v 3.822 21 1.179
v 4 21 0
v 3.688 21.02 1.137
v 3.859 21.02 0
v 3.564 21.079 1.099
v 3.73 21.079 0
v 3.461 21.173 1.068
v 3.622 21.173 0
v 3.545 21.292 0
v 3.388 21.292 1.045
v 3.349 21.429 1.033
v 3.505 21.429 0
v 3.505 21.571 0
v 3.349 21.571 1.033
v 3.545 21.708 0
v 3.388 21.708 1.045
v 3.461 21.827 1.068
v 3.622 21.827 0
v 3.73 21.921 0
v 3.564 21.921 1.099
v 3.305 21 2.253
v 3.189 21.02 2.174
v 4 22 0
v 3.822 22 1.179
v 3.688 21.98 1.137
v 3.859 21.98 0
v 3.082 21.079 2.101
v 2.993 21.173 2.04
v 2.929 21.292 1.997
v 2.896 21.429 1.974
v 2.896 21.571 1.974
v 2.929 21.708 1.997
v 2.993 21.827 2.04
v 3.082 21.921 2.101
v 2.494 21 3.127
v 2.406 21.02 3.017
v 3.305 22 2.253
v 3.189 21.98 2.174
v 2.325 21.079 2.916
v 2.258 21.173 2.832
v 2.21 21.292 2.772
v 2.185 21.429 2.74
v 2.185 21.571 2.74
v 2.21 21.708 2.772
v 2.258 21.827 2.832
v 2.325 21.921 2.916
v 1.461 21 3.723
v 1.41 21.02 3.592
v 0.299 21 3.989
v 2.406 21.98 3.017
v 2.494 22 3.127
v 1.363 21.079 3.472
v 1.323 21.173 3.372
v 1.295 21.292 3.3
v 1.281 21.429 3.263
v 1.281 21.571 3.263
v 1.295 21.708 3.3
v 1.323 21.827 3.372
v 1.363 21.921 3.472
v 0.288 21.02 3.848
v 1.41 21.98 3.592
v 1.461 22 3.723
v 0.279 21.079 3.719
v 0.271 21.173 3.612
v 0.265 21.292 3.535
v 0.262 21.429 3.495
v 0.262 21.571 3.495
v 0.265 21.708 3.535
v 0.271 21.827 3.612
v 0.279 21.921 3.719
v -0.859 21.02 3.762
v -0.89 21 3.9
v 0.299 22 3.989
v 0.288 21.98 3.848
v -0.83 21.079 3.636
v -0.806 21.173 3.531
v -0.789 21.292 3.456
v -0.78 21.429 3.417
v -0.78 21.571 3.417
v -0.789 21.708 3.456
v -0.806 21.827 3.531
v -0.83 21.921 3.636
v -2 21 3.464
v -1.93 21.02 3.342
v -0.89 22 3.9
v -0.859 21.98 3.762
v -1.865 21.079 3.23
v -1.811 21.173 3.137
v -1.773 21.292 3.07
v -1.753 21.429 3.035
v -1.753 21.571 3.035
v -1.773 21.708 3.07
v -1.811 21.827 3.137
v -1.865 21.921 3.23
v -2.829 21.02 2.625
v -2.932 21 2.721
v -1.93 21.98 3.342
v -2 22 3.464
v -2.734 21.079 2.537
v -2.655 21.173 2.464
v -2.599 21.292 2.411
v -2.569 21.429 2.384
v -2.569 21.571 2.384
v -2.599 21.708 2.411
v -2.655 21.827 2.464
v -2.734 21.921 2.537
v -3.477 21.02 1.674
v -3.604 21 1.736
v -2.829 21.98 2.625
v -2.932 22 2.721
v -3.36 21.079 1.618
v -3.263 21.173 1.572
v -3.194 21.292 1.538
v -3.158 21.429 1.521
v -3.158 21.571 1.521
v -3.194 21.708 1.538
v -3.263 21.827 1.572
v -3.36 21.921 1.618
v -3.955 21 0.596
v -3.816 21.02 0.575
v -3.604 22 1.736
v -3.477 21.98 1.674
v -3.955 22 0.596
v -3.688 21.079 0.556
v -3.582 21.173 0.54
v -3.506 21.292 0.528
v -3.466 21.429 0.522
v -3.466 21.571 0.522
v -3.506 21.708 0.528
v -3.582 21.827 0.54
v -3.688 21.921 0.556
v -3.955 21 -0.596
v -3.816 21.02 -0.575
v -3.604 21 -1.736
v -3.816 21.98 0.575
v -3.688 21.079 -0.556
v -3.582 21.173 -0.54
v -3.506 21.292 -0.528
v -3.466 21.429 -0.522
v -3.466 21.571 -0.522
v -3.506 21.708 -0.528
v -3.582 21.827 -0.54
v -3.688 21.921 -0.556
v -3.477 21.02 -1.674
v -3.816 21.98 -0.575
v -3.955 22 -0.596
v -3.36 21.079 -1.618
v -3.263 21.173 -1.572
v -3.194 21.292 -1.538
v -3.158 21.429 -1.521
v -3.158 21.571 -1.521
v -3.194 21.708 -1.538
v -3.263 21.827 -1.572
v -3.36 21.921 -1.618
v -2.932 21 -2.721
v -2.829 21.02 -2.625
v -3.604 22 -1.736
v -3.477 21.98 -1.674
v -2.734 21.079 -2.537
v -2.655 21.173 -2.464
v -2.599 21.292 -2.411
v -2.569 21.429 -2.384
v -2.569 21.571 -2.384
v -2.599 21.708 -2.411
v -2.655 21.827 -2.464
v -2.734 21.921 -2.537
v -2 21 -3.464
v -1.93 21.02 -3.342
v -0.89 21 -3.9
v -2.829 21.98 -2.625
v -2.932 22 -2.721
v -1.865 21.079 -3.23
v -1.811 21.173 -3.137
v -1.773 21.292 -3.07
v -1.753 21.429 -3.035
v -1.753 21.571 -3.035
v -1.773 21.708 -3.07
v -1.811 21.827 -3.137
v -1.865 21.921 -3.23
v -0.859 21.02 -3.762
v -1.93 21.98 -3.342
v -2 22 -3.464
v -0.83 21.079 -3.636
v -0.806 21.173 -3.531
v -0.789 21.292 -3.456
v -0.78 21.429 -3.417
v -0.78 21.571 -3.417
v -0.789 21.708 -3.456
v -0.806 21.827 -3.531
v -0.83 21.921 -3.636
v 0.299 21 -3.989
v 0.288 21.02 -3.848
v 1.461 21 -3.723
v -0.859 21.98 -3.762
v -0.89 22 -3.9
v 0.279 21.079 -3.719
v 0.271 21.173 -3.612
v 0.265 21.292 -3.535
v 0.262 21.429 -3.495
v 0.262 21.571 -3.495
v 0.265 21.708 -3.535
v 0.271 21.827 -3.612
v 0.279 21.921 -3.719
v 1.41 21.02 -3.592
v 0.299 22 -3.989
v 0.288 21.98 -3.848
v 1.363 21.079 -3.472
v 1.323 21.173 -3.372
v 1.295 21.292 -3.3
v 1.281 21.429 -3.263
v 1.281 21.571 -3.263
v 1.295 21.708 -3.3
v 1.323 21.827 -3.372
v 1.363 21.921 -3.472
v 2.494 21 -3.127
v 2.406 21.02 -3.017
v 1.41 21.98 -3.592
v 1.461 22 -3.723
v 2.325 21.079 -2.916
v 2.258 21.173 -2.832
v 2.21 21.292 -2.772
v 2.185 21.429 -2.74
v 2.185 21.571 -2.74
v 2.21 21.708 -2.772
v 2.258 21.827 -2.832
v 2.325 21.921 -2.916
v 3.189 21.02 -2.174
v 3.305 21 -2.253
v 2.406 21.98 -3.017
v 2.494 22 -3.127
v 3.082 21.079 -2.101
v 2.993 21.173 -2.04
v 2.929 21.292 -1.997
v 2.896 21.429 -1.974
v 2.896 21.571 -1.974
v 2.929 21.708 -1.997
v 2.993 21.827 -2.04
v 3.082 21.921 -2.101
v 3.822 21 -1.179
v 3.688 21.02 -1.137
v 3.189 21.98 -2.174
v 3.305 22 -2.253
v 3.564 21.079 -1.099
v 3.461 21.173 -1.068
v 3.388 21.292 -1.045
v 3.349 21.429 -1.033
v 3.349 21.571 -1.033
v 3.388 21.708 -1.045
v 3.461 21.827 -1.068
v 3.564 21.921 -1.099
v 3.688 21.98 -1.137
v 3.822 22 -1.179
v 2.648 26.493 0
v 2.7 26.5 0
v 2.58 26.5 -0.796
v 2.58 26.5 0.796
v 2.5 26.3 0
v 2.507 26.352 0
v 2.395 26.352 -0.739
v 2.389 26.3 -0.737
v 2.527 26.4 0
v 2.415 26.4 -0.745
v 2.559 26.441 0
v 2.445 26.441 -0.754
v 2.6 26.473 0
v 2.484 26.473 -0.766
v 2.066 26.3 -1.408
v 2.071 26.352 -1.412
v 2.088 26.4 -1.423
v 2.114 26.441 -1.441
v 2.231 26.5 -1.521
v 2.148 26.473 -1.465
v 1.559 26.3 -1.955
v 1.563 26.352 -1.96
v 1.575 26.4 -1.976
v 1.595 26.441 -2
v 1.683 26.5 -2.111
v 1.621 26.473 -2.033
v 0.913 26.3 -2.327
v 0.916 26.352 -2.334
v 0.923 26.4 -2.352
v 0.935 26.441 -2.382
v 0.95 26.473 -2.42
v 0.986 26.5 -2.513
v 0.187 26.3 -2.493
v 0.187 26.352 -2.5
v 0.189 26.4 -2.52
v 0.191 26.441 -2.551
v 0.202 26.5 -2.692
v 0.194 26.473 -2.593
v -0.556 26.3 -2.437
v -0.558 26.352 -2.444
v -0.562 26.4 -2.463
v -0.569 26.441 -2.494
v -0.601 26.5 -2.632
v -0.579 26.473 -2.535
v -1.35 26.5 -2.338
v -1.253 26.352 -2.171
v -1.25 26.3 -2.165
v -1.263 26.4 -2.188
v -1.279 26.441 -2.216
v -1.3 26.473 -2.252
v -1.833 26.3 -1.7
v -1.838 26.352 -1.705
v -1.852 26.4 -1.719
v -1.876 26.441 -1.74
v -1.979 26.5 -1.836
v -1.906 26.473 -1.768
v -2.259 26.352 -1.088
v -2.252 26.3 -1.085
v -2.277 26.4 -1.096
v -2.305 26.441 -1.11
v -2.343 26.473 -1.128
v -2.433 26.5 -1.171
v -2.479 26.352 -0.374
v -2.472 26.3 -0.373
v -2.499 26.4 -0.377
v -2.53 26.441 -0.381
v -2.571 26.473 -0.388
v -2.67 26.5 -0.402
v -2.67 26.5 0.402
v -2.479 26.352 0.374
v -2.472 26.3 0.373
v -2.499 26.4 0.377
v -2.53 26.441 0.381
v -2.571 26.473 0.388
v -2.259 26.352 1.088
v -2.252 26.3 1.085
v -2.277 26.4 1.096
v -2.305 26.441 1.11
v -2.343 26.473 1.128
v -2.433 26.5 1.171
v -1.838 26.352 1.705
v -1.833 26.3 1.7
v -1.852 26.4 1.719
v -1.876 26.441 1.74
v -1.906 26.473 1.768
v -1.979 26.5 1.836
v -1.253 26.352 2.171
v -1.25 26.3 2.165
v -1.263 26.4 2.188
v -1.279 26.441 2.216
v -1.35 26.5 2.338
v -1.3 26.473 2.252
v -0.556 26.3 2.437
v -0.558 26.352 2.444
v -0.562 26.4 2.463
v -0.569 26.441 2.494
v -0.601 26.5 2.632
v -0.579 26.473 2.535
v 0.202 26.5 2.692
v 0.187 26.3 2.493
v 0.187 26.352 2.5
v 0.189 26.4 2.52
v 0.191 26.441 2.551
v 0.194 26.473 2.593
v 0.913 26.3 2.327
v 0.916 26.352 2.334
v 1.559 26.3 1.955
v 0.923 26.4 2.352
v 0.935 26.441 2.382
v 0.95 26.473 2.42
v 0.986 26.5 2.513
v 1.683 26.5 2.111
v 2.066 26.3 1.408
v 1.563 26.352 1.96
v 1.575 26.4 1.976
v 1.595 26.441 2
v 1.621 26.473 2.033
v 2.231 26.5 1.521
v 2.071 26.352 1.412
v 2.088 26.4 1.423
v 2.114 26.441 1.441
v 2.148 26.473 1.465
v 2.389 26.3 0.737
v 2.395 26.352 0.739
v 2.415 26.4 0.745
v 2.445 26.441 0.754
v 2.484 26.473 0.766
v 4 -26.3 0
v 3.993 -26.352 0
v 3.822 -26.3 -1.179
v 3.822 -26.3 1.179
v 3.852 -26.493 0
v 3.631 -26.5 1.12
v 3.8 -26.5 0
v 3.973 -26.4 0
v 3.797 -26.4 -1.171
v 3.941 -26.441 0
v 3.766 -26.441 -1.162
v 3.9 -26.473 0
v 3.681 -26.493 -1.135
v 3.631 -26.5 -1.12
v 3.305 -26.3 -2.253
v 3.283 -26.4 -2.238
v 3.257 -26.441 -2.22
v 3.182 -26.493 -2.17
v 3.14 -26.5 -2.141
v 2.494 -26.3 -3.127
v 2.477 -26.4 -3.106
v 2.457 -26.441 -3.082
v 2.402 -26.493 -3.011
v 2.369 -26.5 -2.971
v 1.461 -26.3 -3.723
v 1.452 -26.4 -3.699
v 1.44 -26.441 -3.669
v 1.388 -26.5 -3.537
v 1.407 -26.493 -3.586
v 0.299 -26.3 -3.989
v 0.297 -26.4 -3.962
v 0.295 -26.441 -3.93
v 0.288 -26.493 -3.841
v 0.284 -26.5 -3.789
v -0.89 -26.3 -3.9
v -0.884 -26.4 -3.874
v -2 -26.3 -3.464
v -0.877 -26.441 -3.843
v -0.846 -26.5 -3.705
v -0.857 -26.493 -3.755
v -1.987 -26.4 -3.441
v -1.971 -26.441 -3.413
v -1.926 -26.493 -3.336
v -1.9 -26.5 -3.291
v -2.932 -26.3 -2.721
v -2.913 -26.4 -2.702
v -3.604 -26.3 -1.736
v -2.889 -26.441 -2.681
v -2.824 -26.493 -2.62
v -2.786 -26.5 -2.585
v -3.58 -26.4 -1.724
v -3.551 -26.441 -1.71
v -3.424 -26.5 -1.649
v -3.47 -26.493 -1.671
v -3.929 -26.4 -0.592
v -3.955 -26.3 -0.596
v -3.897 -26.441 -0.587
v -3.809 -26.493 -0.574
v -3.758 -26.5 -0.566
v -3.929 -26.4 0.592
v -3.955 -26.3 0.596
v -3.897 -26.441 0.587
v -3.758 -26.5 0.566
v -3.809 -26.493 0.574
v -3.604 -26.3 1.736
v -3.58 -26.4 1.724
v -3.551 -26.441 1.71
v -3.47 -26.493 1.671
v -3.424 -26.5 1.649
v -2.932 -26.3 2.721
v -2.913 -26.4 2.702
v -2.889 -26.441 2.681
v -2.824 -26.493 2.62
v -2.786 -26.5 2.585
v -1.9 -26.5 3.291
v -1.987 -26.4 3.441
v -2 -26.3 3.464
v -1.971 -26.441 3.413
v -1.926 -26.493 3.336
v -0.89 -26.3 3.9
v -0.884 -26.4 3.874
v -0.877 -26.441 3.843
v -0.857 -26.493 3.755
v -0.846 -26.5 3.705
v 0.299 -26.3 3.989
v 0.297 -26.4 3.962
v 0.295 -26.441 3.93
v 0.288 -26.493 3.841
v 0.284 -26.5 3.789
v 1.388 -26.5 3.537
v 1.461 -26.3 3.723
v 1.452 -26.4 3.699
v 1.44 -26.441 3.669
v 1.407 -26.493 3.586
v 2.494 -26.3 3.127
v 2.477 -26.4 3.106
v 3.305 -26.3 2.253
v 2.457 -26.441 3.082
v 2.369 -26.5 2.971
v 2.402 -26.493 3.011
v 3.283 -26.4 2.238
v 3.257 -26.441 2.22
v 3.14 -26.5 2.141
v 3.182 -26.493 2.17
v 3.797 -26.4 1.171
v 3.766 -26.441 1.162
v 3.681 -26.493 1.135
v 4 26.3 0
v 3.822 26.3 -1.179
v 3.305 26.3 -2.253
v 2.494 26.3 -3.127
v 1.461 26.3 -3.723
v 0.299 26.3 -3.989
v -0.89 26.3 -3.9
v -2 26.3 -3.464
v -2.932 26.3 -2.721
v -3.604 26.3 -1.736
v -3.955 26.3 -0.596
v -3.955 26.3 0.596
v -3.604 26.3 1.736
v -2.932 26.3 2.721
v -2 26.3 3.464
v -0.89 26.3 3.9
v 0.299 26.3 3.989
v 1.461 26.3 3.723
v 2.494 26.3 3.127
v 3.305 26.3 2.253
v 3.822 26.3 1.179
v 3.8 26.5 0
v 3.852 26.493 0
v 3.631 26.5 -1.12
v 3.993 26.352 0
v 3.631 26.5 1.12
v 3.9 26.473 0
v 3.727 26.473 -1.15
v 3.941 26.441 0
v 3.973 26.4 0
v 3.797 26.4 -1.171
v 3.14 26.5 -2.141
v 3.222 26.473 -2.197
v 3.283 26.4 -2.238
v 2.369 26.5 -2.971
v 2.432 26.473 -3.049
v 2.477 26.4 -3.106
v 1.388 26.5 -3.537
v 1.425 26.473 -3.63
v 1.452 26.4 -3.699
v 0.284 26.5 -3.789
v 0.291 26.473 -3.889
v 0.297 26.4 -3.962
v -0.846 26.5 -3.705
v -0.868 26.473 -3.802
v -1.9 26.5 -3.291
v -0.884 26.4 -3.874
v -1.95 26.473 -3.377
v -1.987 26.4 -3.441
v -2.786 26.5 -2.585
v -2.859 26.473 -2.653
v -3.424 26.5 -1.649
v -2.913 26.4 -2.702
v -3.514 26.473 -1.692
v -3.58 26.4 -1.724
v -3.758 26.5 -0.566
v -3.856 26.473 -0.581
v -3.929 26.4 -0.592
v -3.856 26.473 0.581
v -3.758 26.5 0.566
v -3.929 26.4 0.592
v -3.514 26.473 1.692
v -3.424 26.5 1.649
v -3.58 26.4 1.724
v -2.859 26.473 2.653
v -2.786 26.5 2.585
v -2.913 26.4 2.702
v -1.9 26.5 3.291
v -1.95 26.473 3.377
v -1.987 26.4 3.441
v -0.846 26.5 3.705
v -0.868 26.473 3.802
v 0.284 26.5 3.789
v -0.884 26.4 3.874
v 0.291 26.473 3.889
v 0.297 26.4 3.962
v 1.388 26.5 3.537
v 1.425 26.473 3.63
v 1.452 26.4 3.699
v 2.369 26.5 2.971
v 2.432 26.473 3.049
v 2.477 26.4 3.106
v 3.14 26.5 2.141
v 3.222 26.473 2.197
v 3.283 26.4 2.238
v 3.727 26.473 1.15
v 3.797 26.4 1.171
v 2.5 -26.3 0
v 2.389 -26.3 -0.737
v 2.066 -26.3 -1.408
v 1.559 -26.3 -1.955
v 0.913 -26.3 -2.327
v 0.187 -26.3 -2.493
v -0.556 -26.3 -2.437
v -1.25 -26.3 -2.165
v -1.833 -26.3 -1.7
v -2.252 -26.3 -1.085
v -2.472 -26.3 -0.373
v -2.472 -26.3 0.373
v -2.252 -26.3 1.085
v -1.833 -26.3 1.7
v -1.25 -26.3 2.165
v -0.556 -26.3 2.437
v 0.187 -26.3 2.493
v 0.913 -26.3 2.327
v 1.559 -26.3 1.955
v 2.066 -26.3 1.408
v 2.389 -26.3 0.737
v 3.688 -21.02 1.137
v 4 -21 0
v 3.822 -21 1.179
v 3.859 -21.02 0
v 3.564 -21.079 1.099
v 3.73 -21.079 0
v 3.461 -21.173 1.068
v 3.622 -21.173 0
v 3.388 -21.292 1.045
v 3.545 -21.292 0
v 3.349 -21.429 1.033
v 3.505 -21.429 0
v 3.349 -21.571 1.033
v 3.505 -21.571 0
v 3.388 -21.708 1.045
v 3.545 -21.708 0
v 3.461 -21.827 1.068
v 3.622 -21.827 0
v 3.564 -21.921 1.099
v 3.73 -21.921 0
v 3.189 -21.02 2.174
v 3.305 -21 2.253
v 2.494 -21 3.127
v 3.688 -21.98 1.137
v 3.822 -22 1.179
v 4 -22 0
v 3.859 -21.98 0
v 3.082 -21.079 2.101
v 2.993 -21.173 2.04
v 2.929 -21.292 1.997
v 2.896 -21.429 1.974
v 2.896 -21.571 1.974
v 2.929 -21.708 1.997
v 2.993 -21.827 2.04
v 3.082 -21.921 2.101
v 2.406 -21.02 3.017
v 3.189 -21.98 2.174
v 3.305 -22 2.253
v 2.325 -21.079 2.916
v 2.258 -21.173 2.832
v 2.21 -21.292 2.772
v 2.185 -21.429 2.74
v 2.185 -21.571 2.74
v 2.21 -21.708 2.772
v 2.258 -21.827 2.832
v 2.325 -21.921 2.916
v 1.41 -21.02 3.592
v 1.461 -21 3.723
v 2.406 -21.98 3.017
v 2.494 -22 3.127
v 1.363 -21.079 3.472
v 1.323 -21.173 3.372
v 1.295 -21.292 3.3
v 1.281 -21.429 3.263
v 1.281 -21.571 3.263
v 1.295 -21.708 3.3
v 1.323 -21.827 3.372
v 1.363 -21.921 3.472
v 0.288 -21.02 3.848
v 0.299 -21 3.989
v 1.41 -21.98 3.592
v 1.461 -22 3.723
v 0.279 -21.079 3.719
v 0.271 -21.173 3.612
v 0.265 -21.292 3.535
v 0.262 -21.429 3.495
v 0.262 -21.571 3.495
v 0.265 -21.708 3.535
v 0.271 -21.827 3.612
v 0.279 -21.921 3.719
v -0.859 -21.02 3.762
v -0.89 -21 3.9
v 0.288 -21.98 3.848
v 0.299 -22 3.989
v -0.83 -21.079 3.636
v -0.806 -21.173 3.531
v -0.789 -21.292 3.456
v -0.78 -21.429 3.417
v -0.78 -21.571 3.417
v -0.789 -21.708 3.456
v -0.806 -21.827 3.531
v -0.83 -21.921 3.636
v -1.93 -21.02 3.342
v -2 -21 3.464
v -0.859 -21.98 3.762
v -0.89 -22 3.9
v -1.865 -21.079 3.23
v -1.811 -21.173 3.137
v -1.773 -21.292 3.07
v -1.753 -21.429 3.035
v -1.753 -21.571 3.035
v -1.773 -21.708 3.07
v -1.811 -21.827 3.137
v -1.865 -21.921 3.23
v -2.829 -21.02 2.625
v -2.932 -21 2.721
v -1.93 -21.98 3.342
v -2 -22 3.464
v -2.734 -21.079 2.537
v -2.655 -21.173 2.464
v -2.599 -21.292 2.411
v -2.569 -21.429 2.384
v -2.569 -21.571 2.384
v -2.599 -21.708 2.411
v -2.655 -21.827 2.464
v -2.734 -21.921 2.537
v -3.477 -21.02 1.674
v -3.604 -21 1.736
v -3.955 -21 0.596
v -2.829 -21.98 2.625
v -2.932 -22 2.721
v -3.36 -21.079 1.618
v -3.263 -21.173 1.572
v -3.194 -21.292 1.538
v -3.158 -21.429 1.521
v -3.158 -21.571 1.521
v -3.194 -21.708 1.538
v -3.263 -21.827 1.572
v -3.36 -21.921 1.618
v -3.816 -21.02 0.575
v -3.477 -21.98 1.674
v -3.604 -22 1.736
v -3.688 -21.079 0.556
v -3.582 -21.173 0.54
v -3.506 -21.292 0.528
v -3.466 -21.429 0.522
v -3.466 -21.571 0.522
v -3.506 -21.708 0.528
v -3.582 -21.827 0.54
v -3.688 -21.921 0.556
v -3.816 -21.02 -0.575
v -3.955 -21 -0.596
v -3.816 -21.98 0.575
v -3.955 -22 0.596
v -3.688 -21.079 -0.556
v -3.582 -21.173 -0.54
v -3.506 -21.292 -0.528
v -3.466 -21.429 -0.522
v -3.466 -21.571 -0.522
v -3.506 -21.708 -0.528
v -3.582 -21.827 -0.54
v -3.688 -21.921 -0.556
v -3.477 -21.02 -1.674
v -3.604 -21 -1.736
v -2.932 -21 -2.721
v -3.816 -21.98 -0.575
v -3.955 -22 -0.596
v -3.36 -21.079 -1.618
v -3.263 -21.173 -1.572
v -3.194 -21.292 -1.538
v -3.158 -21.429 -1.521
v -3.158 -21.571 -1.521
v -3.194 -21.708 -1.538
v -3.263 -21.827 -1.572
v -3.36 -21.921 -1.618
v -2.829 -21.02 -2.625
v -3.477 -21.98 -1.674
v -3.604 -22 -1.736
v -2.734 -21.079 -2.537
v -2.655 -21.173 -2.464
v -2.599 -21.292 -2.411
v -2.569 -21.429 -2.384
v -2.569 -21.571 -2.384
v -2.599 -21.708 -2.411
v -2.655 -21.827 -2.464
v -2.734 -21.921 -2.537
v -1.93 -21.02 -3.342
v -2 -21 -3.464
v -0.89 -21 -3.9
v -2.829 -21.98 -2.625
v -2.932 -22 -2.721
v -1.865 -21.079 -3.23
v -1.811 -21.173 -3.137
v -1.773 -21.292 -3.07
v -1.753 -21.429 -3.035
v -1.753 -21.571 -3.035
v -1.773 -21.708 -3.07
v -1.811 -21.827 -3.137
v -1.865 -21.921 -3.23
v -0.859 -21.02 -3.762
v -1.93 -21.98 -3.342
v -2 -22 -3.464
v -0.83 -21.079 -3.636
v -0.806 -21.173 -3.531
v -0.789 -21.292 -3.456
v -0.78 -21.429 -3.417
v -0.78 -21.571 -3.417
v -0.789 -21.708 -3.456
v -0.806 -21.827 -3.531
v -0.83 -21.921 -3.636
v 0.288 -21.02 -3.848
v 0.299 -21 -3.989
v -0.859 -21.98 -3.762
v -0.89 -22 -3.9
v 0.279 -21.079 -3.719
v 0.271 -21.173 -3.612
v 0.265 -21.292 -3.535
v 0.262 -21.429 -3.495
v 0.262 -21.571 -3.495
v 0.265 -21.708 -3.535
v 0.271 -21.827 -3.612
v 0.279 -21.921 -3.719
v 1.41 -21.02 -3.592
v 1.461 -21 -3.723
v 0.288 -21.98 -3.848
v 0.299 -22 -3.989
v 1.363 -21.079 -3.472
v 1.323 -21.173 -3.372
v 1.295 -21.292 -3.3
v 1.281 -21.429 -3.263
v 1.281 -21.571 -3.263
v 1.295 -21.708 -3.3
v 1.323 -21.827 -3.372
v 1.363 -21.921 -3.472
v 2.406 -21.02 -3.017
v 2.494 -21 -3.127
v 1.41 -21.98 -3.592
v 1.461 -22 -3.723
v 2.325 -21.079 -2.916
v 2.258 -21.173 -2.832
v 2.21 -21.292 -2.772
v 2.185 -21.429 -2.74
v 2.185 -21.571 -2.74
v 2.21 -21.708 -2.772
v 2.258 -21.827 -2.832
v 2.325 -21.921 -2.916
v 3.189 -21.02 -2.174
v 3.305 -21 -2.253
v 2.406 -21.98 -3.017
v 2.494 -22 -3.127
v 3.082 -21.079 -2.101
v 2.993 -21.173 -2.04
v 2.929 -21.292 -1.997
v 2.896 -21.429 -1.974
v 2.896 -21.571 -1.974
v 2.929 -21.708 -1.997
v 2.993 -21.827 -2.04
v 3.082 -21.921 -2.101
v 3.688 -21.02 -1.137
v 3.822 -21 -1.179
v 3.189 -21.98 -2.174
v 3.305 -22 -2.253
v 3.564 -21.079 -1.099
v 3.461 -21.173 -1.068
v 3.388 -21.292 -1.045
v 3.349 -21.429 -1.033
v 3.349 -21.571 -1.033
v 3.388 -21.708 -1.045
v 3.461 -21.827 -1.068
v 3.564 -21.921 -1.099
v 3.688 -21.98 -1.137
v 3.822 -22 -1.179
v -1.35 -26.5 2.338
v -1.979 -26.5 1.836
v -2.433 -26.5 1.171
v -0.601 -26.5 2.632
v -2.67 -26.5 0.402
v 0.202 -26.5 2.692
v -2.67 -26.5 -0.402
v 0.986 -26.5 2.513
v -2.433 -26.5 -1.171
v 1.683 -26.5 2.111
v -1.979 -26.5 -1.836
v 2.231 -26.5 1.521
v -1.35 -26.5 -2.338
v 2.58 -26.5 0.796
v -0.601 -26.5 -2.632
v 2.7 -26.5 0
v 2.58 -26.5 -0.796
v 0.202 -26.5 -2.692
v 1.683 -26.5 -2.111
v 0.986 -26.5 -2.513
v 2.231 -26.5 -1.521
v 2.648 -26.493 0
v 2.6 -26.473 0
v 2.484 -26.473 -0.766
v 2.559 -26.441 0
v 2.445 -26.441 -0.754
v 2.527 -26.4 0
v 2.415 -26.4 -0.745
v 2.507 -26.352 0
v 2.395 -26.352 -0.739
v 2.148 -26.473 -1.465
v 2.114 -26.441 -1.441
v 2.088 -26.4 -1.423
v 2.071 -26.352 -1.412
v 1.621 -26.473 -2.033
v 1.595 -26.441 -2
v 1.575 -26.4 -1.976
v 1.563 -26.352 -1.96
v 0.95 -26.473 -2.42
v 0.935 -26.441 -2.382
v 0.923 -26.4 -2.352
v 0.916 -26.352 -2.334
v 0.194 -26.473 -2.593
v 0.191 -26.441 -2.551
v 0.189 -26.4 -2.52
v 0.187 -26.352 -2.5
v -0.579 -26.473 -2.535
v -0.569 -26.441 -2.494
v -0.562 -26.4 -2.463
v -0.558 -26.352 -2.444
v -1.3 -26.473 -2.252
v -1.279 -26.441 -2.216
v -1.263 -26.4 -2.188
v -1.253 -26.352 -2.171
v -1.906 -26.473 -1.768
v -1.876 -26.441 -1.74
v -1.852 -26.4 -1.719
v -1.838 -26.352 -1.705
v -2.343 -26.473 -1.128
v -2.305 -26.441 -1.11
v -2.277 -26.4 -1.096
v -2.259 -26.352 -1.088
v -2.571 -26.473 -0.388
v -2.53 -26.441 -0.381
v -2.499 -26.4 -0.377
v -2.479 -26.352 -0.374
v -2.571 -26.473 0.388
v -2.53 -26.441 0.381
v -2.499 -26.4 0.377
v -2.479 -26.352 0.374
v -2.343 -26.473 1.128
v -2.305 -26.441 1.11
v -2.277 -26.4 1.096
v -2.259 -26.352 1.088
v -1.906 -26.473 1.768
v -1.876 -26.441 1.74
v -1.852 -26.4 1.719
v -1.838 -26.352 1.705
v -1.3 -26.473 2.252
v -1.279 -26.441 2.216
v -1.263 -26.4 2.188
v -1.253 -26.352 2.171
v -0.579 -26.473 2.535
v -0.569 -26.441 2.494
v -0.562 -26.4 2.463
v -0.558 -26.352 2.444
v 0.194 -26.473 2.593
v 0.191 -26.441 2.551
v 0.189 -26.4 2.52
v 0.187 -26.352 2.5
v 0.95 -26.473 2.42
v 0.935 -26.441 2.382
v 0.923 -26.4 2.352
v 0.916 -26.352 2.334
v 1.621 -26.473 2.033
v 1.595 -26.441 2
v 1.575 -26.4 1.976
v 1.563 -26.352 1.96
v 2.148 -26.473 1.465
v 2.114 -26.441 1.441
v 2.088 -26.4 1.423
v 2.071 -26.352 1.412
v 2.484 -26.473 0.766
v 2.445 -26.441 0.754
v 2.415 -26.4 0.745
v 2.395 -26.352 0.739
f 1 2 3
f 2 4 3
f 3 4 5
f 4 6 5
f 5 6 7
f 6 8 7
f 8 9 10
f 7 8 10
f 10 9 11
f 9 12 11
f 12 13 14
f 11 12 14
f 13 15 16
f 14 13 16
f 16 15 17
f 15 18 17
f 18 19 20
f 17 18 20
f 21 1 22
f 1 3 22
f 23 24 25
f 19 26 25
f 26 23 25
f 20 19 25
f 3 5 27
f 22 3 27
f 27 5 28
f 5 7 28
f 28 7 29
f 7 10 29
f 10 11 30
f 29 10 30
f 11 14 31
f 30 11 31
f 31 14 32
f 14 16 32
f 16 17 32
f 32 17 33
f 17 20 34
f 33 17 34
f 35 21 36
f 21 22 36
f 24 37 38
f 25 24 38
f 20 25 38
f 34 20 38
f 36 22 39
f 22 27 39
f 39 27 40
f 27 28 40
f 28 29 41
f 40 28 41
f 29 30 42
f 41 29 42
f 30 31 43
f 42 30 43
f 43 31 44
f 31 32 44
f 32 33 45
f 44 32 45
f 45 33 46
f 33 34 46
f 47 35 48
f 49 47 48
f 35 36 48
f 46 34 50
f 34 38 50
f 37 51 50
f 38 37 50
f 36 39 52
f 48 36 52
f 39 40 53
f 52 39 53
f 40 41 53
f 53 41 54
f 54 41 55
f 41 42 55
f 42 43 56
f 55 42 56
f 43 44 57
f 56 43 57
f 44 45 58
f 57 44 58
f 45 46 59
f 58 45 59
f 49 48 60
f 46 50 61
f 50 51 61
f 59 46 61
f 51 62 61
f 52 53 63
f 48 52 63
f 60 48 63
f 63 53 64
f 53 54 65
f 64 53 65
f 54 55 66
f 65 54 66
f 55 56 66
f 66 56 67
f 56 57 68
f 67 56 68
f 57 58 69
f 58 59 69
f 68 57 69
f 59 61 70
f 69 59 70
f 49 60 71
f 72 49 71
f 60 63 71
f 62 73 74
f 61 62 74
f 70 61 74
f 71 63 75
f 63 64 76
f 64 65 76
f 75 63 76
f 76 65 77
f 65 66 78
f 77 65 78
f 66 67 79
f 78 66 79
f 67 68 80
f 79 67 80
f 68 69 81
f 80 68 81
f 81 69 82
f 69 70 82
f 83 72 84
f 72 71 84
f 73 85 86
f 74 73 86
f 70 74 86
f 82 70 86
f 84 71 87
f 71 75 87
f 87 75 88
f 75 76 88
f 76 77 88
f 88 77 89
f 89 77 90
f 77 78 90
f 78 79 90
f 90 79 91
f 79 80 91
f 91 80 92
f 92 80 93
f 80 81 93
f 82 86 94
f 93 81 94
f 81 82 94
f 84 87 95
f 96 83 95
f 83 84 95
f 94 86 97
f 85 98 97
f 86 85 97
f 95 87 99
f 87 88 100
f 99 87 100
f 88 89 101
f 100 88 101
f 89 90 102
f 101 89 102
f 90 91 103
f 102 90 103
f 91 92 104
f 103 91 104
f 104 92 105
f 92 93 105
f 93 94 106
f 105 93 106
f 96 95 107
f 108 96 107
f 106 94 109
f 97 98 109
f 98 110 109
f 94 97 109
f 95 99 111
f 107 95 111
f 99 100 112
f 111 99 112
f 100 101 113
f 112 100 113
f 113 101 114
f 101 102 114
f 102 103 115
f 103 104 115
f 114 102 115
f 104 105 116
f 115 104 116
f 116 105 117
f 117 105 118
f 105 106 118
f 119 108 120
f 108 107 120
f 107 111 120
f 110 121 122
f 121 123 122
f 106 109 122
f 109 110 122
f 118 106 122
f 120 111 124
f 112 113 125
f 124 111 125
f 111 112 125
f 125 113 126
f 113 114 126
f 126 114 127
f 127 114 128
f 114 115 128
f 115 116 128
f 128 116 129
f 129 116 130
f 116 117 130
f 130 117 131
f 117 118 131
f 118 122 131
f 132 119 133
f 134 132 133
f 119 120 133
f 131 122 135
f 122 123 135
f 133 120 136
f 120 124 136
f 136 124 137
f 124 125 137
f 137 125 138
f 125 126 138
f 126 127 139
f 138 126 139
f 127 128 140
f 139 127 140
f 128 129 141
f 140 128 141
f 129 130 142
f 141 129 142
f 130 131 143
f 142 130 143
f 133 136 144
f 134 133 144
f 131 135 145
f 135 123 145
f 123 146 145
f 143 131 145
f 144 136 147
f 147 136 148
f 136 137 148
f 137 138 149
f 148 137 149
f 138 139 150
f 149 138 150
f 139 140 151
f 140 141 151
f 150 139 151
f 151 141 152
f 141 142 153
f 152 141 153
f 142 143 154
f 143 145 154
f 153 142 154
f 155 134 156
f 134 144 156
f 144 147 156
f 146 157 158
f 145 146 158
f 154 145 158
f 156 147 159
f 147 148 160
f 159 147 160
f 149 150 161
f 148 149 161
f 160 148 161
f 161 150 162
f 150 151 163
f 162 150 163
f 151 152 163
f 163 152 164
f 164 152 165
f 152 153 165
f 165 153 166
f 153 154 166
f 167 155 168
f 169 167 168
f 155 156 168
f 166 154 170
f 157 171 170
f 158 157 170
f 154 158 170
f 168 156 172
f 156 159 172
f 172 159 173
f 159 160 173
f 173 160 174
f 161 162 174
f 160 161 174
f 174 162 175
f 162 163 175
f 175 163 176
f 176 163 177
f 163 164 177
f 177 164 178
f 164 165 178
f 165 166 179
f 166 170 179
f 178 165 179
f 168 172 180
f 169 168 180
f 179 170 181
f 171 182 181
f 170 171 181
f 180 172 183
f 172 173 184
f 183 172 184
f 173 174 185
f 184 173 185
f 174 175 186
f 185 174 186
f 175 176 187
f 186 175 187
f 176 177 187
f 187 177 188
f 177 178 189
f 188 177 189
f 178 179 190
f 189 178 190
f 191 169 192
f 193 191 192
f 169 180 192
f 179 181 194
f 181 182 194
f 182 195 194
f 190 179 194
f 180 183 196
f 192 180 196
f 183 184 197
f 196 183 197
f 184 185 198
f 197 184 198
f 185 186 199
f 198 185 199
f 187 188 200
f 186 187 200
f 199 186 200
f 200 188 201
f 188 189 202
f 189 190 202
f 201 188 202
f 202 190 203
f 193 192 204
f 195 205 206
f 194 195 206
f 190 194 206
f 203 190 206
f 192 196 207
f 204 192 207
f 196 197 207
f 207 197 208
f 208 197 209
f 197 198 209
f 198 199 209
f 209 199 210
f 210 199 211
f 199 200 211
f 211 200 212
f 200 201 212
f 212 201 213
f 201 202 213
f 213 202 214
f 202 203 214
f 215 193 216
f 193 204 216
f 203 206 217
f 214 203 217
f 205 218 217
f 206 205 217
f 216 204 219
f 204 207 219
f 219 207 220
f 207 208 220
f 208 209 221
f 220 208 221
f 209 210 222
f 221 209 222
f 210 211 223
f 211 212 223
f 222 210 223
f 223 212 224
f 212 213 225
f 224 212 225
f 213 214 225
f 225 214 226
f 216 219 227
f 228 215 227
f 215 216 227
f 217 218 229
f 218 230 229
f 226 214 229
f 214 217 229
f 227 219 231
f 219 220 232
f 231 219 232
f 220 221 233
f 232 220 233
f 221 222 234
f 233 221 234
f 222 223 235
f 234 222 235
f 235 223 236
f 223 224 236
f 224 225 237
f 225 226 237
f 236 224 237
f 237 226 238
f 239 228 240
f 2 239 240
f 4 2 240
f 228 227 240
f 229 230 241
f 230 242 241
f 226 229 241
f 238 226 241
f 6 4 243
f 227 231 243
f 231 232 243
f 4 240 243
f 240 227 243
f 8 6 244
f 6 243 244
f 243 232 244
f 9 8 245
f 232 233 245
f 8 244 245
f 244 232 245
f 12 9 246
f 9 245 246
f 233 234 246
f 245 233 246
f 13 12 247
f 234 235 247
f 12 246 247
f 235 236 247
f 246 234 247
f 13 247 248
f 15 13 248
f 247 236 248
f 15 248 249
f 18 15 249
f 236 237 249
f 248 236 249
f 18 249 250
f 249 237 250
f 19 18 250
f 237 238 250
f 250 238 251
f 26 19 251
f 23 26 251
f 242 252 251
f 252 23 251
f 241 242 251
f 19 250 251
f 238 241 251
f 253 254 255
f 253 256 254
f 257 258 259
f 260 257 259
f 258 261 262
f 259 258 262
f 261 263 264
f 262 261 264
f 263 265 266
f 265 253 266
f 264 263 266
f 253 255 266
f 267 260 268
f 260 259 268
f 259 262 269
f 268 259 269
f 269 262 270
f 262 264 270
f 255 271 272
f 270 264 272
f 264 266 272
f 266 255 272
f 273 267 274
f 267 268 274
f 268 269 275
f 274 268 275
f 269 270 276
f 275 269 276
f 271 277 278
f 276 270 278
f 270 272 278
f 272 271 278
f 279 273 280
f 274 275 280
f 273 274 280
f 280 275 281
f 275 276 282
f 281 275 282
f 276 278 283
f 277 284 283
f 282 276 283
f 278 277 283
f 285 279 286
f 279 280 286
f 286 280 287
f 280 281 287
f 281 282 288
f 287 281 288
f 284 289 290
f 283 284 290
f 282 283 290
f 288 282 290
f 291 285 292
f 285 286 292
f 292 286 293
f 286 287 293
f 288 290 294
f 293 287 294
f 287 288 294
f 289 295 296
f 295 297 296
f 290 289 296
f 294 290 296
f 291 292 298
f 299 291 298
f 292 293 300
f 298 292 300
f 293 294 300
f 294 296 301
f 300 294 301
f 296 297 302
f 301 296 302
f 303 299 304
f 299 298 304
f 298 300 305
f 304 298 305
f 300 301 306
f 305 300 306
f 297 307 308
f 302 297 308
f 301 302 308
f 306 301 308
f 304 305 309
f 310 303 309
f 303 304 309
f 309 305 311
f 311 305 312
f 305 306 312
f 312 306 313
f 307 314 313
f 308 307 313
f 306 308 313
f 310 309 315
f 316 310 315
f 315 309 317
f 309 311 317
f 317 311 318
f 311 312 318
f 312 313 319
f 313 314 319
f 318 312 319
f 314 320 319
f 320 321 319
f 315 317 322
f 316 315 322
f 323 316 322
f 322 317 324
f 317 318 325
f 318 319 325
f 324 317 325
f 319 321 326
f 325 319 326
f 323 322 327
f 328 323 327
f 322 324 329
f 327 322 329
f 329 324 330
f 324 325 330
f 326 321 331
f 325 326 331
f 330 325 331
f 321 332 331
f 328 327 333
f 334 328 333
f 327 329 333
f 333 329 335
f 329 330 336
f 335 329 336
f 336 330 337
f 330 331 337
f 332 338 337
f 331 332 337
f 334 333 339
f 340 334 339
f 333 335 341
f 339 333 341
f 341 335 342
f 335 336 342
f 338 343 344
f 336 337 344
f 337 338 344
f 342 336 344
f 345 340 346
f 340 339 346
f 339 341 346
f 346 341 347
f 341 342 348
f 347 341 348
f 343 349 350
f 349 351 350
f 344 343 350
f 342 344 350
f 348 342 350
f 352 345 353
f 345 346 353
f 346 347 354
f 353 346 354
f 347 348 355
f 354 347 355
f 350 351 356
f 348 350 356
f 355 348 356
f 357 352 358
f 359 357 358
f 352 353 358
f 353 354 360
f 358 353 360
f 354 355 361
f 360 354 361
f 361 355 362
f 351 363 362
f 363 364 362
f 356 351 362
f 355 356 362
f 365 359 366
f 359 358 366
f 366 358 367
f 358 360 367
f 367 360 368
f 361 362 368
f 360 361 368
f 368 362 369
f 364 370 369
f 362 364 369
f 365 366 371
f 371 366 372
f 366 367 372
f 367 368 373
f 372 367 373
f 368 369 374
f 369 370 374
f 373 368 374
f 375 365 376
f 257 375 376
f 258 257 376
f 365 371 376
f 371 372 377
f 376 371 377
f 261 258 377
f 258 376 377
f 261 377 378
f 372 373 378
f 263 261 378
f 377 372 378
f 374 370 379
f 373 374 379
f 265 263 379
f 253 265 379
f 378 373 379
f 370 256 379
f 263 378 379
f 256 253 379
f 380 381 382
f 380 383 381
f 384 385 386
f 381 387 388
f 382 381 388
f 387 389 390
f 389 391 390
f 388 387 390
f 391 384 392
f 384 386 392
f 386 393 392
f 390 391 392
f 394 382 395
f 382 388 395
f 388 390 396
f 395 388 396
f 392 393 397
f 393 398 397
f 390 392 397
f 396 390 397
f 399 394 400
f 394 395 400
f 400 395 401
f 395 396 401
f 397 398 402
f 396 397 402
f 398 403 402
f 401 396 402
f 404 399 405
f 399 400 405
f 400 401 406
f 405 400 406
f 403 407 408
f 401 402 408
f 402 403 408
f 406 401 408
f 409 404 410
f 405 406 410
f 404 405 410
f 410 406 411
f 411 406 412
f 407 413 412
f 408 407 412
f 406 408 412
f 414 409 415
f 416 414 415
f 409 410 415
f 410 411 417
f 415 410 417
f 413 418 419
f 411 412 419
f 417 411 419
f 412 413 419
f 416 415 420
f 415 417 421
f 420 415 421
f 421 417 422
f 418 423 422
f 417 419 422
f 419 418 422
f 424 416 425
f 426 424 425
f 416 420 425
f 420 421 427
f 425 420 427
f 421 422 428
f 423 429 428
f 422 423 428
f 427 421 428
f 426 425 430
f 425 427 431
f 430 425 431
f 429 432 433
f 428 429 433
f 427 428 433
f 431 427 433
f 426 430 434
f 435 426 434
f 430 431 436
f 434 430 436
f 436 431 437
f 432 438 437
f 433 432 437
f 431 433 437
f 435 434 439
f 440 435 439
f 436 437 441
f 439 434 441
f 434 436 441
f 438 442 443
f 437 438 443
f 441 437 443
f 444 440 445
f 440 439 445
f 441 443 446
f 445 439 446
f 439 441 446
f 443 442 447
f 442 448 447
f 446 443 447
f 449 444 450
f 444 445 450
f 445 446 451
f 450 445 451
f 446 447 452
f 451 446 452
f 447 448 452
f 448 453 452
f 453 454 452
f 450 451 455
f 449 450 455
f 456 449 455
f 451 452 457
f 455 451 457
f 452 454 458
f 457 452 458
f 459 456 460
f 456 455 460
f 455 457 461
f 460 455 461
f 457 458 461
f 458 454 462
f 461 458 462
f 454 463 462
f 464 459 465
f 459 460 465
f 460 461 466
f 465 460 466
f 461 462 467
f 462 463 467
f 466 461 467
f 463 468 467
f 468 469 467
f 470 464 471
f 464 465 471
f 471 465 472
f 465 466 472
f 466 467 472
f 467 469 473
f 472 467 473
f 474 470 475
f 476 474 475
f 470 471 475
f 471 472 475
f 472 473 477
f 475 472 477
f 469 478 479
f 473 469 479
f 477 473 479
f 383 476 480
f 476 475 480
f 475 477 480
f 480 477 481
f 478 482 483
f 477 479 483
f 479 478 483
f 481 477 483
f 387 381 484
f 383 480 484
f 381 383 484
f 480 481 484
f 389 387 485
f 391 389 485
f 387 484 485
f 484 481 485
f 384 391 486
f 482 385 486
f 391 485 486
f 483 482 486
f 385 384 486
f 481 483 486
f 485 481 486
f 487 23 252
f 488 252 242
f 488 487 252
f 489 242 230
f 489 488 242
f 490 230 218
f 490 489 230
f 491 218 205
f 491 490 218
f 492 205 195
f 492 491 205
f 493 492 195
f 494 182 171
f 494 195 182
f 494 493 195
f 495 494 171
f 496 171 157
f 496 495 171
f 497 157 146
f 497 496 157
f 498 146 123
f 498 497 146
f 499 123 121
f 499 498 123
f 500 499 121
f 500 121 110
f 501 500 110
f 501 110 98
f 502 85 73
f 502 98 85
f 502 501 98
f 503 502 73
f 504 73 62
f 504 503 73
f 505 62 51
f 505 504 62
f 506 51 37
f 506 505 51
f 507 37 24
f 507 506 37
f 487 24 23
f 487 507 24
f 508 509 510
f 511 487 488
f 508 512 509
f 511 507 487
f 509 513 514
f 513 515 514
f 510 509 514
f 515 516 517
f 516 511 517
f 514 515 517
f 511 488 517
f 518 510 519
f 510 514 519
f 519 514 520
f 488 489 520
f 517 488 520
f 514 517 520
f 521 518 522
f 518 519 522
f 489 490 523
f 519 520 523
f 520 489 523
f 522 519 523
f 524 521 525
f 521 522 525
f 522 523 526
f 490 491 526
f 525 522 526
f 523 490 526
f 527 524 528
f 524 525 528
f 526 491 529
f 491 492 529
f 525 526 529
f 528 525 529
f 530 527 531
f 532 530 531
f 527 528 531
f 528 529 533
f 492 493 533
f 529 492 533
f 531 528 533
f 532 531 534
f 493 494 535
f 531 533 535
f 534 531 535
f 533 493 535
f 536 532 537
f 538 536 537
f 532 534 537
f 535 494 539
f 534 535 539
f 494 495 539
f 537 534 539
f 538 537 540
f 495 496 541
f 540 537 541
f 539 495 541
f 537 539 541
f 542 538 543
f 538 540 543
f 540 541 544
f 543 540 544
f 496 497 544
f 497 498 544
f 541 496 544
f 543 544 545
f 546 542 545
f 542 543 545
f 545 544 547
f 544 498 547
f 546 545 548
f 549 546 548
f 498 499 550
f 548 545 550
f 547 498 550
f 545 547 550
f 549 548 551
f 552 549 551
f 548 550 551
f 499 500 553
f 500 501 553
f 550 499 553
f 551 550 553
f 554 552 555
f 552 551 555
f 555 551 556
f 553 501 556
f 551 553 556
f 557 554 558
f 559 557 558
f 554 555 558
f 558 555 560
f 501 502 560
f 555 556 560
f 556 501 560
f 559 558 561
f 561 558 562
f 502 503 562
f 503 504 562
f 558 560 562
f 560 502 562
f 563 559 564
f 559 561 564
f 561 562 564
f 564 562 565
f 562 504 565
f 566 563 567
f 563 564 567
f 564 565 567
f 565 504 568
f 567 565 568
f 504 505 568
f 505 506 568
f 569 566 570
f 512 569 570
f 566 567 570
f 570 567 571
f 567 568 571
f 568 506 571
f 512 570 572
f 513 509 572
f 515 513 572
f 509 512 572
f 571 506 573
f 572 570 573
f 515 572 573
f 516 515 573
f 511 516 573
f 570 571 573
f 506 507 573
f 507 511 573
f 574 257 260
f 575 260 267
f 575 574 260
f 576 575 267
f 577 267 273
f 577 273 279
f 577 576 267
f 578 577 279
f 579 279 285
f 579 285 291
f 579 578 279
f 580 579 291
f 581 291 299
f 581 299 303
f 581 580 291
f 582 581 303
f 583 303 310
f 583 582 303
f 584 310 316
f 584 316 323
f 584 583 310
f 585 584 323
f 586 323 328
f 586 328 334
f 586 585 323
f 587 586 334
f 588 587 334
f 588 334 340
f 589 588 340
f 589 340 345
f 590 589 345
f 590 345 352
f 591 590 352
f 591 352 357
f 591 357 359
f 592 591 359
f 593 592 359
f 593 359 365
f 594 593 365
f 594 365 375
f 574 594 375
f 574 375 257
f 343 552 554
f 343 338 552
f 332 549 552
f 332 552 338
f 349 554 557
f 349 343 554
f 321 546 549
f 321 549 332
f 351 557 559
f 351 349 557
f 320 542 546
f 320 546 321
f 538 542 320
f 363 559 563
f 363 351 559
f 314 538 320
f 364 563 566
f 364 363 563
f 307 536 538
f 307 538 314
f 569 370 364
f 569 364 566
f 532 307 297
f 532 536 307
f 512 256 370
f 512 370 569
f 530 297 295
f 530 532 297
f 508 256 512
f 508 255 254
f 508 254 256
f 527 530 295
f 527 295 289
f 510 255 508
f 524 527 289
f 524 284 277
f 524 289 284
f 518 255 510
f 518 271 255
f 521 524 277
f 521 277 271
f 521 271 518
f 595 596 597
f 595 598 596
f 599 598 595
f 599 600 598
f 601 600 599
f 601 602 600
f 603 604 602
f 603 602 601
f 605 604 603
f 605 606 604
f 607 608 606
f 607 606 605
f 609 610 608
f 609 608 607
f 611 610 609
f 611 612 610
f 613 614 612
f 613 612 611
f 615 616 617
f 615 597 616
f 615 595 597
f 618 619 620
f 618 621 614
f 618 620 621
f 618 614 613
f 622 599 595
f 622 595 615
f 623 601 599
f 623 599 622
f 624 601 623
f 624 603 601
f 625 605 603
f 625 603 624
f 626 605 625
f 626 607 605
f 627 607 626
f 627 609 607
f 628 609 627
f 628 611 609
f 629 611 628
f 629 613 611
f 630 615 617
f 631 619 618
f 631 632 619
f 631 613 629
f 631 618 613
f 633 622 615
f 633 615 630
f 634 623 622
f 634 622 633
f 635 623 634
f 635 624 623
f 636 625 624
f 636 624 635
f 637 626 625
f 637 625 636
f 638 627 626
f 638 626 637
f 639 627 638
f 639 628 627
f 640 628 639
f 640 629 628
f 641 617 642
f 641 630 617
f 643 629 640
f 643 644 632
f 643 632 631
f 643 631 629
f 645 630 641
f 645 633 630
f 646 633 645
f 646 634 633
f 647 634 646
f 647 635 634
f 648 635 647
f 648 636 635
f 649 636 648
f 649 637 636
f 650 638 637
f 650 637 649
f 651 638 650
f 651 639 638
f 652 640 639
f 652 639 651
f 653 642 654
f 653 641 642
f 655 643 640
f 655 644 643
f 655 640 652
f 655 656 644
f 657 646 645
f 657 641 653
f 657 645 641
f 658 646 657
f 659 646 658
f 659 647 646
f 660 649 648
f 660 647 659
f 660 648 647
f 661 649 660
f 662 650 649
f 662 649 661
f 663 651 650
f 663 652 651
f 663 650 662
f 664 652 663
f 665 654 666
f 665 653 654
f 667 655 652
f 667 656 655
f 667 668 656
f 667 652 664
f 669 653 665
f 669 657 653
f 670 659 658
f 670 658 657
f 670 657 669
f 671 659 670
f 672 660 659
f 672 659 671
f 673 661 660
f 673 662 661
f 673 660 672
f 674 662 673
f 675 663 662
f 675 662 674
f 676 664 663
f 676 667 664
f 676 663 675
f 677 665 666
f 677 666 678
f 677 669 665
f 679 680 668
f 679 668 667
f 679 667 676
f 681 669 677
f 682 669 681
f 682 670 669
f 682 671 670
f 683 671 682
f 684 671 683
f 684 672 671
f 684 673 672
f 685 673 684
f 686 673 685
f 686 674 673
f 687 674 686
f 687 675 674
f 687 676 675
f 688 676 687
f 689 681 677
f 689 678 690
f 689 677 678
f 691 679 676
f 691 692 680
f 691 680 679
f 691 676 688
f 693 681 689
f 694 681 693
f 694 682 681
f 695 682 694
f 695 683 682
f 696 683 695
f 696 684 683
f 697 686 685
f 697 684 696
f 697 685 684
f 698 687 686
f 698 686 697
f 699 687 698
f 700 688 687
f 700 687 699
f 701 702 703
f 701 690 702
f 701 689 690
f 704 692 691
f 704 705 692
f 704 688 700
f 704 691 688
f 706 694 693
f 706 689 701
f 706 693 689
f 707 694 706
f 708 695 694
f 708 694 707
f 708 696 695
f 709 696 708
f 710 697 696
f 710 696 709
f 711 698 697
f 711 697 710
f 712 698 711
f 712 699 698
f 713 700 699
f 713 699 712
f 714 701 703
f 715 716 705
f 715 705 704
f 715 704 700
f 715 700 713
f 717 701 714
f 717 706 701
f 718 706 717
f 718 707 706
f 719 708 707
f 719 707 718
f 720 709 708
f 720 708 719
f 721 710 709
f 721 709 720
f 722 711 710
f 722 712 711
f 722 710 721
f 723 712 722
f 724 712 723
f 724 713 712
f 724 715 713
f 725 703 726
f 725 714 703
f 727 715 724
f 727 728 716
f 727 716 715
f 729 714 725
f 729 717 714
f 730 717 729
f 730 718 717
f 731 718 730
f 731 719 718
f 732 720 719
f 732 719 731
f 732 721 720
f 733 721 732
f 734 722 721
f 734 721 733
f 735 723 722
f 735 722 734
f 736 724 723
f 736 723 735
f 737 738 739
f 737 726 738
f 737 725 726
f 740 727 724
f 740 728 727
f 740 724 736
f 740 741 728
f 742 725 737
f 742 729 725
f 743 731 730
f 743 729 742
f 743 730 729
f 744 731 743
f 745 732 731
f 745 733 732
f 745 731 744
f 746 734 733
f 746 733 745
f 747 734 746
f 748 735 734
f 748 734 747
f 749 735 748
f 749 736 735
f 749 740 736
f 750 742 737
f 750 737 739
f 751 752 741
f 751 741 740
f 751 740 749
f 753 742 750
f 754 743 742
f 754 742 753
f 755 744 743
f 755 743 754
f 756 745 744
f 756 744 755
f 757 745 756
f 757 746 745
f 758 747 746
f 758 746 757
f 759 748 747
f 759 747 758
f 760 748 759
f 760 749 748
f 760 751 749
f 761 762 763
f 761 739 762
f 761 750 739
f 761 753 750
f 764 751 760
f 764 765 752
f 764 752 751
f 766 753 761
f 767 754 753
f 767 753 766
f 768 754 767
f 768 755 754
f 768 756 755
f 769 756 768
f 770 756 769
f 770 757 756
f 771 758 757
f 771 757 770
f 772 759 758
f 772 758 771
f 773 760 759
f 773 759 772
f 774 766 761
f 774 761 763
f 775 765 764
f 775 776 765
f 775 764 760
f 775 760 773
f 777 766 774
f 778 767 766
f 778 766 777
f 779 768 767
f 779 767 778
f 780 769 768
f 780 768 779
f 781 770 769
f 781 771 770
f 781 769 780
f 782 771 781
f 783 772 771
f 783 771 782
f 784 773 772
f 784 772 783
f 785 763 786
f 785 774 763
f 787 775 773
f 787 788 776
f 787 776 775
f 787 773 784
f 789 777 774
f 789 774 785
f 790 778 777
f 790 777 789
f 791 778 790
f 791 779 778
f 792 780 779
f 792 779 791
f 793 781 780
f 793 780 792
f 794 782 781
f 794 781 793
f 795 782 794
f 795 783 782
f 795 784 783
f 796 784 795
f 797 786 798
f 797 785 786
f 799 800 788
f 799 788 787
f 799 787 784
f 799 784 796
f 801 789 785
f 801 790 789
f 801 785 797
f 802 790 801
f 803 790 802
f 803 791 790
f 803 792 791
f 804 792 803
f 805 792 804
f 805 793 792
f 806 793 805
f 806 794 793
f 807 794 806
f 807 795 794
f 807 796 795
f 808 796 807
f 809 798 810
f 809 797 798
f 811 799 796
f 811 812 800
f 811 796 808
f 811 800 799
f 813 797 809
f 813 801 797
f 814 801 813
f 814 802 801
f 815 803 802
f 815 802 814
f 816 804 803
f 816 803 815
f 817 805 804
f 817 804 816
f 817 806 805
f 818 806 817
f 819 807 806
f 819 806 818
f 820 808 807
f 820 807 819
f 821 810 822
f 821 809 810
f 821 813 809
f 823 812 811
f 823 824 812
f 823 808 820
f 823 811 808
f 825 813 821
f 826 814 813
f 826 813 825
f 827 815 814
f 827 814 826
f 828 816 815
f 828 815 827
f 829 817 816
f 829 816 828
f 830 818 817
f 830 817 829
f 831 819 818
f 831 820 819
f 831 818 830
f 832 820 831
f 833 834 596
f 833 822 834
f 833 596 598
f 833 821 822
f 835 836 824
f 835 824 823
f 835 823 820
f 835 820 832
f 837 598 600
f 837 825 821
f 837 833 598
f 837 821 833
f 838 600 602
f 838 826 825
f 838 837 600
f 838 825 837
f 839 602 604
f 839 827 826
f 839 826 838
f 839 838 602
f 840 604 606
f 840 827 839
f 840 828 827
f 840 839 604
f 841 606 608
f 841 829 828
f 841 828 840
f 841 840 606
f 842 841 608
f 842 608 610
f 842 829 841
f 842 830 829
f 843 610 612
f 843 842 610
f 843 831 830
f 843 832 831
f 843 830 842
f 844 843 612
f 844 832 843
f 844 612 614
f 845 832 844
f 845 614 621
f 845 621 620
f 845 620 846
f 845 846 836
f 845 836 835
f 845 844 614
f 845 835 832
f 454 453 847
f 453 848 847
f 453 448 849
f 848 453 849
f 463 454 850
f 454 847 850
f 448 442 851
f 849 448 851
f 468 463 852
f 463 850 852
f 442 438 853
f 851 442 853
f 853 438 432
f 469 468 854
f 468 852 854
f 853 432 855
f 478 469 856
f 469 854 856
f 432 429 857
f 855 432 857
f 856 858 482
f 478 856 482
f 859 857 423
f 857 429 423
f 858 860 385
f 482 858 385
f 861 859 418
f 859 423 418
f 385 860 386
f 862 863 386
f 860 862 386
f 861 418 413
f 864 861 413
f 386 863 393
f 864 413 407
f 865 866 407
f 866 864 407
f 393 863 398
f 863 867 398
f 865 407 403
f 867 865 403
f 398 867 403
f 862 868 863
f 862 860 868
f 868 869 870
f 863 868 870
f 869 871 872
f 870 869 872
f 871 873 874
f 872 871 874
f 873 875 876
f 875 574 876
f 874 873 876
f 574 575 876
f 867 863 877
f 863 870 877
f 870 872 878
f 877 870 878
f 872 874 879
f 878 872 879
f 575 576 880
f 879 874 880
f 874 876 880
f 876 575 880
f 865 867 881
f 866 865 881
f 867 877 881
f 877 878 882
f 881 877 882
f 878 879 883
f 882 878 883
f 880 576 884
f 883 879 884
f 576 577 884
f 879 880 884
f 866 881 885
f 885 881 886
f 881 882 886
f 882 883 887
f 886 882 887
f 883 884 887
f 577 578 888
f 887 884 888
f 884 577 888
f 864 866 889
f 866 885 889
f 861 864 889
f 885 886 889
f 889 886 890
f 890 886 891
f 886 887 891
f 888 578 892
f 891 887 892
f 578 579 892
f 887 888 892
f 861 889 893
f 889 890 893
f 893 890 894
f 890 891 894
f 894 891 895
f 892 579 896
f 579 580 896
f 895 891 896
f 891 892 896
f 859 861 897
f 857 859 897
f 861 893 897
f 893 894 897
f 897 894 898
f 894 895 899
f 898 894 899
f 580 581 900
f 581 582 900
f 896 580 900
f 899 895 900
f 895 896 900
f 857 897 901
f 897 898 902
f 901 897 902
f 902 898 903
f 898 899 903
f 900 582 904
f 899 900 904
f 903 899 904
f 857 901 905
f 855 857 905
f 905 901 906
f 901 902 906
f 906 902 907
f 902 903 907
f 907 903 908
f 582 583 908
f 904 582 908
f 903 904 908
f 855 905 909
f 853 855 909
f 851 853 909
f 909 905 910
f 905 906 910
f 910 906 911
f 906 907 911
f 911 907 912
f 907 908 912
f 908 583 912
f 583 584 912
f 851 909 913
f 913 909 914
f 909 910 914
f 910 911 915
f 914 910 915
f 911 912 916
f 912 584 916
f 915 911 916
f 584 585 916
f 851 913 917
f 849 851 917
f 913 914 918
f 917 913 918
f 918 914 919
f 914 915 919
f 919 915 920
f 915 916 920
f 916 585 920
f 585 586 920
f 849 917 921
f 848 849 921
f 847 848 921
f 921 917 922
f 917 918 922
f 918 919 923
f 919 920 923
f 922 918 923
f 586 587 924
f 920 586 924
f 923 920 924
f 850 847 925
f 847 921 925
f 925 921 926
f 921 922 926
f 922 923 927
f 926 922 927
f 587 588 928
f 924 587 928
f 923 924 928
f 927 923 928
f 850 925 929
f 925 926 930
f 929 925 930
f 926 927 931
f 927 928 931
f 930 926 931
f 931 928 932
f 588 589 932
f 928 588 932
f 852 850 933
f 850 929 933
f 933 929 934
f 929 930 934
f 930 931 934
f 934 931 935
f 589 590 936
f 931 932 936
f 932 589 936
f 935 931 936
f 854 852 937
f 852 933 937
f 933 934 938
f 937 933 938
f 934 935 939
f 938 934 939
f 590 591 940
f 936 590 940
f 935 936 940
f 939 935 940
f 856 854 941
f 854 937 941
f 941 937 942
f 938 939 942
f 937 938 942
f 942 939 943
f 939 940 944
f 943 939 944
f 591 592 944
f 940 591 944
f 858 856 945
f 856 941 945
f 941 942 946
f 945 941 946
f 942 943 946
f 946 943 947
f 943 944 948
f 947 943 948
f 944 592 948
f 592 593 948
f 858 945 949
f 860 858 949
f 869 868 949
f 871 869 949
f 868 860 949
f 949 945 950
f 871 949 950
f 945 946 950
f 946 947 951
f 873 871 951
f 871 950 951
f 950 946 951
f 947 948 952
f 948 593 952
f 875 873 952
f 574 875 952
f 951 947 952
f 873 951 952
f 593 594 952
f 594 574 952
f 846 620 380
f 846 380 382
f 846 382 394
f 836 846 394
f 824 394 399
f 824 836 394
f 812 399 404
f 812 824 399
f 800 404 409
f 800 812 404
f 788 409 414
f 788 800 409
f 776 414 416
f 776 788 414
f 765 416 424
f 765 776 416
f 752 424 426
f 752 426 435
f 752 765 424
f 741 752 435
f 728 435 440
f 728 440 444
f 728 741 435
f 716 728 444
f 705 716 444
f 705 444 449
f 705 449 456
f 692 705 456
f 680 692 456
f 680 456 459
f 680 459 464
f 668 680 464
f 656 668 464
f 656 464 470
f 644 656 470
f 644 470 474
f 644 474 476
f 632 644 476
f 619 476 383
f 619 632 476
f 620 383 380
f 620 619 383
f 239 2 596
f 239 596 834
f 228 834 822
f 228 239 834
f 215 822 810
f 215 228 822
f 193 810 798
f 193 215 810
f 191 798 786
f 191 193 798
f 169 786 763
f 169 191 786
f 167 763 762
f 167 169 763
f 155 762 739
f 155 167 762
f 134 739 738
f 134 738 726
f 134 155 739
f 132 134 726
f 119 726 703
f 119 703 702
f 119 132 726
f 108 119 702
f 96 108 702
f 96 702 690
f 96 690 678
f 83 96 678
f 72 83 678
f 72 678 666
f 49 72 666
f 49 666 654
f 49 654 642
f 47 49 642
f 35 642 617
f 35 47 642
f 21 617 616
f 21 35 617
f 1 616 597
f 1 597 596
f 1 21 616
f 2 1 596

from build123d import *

# Parameters (mm, degrees)
SKETCH1_R           = 4
SKETCH1_R_2         = 2.5
BOSS_EXTRUDE1_DEPTH = 26.5
SKETCH2_R           = 0.5
FILLET1_R           = 0.2


with BuildPart() as part:
    # Sketch1 → Boss-Extrude1 (new body, symmetric)
    with BuildSketch(Plane(origin=(0, 0, 0), x_dir=(1, 0, 0), z_dir=(0, 1, 0))):
        Circle(SKETCH1_R)
        Circle(SKETCH1_R_2, mode=Mode.SUBTRACT)
    extrude(amount=BOSS_EXTRUDE1_DEPTH, both=True)

    # Sketch2 → Cut-Revolve1 (revolve, cut)
    with BuildSketch(Plane.XY):
        with Locations((4, -21.5)):
            Circle(SKETCH2_R)
    cut_revolve1 = revolve(axis=Axis((0, 35.374478172, 0), (0, -1, 0)), mode=Mode.SUBTRACT)

    # Mirror1: Cut-Revolve1 across plane
    add(cut_revolve1.mirror(Plane.ZX), mode=Mode.SUBTRACT)

    # Fillet1
    fillet1_edges = [part.edges().sort_by_distance(p)[0] for p in [
        (-4, -26.5, 0),
        (-4, 26.5, 0),
        (-2.5, -26.5, 0),
        (-2.5, 26.5, 0),
    ]]
    fillet(fillet1_edges, radius=FILLET1_R)


solid = part.part
